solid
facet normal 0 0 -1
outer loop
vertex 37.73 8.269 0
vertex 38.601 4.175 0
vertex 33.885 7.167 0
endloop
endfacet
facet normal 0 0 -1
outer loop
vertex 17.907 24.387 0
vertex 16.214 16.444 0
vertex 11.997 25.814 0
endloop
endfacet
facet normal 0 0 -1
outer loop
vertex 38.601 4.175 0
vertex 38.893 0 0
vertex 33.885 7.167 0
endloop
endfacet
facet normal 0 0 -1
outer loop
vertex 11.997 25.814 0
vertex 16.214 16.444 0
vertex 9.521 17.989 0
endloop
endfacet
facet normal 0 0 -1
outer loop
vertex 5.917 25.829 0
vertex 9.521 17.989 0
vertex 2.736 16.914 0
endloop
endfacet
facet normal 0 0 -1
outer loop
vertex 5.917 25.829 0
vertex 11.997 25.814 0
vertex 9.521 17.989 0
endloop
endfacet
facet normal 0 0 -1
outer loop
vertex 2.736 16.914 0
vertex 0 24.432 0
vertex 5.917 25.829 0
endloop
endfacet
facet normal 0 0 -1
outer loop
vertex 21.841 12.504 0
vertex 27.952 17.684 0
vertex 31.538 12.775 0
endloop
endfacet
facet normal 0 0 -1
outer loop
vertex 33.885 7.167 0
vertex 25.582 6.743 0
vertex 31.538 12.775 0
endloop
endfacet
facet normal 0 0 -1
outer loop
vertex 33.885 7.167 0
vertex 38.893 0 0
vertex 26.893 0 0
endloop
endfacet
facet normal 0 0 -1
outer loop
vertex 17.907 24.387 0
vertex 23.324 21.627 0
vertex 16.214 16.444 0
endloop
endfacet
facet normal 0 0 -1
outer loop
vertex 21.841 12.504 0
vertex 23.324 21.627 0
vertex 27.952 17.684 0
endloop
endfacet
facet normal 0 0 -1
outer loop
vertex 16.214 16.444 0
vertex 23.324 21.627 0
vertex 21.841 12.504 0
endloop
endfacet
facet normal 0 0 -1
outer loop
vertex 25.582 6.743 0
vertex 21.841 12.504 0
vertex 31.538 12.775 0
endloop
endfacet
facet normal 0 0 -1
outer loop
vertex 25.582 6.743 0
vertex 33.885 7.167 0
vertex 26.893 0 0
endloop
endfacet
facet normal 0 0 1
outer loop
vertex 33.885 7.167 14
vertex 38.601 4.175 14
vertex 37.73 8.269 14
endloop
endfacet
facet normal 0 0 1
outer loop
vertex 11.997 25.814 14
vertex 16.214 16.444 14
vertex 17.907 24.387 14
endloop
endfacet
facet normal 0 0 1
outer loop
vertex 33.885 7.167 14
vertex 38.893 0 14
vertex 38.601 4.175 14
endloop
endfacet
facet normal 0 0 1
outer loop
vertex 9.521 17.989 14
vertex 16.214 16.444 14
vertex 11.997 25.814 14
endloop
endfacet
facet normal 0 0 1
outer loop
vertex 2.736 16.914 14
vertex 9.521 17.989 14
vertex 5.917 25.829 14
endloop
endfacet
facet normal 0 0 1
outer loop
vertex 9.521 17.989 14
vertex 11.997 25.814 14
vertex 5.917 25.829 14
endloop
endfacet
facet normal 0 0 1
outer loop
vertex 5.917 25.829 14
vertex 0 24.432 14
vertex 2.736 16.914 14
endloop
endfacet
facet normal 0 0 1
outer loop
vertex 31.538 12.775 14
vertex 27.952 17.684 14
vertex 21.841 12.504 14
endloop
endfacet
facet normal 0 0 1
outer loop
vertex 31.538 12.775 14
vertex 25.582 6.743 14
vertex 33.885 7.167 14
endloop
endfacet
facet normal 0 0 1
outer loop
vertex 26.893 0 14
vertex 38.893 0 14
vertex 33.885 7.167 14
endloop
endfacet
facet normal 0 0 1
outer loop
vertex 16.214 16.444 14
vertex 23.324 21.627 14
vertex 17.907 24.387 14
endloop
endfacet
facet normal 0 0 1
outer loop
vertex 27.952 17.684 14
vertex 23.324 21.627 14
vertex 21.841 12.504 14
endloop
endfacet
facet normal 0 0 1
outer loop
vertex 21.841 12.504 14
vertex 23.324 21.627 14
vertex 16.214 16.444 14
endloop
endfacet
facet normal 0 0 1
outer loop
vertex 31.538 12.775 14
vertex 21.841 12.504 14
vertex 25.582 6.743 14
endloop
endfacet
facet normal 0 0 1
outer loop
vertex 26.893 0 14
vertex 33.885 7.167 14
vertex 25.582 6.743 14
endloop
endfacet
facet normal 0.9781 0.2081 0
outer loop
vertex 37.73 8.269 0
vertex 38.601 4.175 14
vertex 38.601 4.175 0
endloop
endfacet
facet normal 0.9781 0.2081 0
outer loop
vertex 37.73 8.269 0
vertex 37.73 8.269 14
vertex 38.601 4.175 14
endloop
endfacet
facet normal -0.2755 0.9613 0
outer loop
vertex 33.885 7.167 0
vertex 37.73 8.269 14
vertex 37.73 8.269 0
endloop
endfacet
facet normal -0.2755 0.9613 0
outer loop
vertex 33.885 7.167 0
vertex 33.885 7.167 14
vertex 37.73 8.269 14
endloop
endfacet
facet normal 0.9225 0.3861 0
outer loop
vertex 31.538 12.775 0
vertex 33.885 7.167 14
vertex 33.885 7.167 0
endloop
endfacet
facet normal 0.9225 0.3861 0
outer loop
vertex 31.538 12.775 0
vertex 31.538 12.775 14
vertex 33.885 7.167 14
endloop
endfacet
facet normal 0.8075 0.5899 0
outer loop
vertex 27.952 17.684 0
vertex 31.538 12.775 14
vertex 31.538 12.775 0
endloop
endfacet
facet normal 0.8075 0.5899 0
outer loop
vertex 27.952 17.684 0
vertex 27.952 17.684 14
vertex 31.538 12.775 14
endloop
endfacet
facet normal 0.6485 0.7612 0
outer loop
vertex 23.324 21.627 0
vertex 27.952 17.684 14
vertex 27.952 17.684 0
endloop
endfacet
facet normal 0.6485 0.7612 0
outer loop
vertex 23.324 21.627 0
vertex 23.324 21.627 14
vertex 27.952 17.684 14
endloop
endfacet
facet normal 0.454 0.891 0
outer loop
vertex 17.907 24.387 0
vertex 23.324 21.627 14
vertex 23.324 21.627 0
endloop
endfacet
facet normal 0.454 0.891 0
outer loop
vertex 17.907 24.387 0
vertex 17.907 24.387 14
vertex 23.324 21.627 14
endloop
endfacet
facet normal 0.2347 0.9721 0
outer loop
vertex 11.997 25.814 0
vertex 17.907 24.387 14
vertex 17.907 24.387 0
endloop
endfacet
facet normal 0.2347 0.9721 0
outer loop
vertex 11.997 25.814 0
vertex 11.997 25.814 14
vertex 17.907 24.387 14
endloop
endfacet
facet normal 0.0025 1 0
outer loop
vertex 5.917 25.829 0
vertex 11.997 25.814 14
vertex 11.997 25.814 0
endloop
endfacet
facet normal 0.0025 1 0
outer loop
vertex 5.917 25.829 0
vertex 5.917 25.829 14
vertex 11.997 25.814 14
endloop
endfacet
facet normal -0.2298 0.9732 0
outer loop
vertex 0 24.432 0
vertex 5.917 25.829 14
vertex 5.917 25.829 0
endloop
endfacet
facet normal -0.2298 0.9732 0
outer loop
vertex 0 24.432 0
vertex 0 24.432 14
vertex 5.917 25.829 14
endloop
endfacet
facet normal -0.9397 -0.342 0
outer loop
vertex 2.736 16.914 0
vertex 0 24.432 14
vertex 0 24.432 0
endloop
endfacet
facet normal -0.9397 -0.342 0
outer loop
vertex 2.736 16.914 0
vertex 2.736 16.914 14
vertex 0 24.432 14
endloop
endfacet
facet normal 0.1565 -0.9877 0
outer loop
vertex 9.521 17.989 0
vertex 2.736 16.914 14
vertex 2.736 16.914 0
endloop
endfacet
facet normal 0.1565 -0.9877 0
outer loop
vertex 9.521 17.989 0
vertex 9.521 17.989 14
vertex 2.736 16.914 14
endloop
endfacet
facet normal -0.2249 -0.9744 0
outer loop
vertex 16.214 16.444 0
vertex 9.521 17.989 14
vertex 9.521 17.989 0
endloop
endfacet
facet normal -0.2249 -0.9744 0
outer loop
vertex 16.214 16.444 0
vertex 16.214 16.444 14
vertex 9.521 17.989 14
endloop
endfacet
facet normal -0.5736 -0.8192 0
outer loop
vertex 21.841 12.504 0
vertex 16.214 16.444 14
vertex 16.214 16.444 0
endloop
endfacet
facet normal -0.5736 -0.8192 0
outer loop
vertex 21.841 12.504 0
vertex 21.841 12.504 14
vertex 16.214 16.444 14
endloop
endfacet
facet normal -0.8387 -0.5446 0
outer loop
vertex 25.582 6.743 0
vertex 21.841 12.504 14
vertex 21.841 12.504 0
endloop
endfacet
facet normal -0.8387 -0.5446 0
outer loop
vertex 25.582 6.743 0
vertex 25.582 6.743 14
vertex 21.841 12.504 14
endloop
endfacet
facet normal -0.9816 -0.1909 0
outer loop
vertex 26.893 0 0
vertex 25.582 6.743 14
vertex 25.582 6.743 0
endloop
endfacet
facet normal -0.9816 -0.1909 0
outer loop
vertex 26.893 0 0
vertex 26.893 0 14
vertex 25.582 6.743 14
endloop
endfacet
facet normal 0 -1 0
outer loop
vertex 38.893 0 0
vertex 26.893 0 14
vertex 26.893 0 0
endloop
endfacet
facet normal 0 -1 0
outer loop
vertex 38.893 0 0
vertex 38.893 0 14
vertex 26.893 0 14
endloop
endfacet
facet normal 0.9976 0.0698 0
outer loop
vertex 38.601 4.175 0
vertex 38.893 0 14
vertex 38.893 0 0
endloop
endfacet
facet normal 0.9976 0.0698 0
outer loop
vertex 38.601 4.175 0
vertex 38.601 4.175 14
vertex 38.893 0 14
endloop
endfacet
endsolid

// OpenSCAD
$fn = 32;

// ----------------------------------------------------------------------
// Arc stop: segment, 14 mm thick
// ----------------------------------------------------------------------

// --- parameters (mm) ---
profile_height = 14;      // extrusion height
profile_points = 17;      // points of the closed outline

profile = [[38.893, 0], [38.601, 4.175], [37.73, 8.269], [33.885, 7.167], [31.538, 12.775], [27.952, 17.684], [23.324, 21.627], [17.907, 24.387], [11.997, 25.814], [5.917, 25.829], [0, 24.432], [2.736, 16.914], [9.521, 17.989], [16.214, 16.444], [21.841, 12.504], [25.582, 6.743], [26.893, 0]];  // single closed polygon, 17 points, counter clockwise

// --- the one profile operation ---
linear_extrude(height = profile_height) polygon(points = profile);
